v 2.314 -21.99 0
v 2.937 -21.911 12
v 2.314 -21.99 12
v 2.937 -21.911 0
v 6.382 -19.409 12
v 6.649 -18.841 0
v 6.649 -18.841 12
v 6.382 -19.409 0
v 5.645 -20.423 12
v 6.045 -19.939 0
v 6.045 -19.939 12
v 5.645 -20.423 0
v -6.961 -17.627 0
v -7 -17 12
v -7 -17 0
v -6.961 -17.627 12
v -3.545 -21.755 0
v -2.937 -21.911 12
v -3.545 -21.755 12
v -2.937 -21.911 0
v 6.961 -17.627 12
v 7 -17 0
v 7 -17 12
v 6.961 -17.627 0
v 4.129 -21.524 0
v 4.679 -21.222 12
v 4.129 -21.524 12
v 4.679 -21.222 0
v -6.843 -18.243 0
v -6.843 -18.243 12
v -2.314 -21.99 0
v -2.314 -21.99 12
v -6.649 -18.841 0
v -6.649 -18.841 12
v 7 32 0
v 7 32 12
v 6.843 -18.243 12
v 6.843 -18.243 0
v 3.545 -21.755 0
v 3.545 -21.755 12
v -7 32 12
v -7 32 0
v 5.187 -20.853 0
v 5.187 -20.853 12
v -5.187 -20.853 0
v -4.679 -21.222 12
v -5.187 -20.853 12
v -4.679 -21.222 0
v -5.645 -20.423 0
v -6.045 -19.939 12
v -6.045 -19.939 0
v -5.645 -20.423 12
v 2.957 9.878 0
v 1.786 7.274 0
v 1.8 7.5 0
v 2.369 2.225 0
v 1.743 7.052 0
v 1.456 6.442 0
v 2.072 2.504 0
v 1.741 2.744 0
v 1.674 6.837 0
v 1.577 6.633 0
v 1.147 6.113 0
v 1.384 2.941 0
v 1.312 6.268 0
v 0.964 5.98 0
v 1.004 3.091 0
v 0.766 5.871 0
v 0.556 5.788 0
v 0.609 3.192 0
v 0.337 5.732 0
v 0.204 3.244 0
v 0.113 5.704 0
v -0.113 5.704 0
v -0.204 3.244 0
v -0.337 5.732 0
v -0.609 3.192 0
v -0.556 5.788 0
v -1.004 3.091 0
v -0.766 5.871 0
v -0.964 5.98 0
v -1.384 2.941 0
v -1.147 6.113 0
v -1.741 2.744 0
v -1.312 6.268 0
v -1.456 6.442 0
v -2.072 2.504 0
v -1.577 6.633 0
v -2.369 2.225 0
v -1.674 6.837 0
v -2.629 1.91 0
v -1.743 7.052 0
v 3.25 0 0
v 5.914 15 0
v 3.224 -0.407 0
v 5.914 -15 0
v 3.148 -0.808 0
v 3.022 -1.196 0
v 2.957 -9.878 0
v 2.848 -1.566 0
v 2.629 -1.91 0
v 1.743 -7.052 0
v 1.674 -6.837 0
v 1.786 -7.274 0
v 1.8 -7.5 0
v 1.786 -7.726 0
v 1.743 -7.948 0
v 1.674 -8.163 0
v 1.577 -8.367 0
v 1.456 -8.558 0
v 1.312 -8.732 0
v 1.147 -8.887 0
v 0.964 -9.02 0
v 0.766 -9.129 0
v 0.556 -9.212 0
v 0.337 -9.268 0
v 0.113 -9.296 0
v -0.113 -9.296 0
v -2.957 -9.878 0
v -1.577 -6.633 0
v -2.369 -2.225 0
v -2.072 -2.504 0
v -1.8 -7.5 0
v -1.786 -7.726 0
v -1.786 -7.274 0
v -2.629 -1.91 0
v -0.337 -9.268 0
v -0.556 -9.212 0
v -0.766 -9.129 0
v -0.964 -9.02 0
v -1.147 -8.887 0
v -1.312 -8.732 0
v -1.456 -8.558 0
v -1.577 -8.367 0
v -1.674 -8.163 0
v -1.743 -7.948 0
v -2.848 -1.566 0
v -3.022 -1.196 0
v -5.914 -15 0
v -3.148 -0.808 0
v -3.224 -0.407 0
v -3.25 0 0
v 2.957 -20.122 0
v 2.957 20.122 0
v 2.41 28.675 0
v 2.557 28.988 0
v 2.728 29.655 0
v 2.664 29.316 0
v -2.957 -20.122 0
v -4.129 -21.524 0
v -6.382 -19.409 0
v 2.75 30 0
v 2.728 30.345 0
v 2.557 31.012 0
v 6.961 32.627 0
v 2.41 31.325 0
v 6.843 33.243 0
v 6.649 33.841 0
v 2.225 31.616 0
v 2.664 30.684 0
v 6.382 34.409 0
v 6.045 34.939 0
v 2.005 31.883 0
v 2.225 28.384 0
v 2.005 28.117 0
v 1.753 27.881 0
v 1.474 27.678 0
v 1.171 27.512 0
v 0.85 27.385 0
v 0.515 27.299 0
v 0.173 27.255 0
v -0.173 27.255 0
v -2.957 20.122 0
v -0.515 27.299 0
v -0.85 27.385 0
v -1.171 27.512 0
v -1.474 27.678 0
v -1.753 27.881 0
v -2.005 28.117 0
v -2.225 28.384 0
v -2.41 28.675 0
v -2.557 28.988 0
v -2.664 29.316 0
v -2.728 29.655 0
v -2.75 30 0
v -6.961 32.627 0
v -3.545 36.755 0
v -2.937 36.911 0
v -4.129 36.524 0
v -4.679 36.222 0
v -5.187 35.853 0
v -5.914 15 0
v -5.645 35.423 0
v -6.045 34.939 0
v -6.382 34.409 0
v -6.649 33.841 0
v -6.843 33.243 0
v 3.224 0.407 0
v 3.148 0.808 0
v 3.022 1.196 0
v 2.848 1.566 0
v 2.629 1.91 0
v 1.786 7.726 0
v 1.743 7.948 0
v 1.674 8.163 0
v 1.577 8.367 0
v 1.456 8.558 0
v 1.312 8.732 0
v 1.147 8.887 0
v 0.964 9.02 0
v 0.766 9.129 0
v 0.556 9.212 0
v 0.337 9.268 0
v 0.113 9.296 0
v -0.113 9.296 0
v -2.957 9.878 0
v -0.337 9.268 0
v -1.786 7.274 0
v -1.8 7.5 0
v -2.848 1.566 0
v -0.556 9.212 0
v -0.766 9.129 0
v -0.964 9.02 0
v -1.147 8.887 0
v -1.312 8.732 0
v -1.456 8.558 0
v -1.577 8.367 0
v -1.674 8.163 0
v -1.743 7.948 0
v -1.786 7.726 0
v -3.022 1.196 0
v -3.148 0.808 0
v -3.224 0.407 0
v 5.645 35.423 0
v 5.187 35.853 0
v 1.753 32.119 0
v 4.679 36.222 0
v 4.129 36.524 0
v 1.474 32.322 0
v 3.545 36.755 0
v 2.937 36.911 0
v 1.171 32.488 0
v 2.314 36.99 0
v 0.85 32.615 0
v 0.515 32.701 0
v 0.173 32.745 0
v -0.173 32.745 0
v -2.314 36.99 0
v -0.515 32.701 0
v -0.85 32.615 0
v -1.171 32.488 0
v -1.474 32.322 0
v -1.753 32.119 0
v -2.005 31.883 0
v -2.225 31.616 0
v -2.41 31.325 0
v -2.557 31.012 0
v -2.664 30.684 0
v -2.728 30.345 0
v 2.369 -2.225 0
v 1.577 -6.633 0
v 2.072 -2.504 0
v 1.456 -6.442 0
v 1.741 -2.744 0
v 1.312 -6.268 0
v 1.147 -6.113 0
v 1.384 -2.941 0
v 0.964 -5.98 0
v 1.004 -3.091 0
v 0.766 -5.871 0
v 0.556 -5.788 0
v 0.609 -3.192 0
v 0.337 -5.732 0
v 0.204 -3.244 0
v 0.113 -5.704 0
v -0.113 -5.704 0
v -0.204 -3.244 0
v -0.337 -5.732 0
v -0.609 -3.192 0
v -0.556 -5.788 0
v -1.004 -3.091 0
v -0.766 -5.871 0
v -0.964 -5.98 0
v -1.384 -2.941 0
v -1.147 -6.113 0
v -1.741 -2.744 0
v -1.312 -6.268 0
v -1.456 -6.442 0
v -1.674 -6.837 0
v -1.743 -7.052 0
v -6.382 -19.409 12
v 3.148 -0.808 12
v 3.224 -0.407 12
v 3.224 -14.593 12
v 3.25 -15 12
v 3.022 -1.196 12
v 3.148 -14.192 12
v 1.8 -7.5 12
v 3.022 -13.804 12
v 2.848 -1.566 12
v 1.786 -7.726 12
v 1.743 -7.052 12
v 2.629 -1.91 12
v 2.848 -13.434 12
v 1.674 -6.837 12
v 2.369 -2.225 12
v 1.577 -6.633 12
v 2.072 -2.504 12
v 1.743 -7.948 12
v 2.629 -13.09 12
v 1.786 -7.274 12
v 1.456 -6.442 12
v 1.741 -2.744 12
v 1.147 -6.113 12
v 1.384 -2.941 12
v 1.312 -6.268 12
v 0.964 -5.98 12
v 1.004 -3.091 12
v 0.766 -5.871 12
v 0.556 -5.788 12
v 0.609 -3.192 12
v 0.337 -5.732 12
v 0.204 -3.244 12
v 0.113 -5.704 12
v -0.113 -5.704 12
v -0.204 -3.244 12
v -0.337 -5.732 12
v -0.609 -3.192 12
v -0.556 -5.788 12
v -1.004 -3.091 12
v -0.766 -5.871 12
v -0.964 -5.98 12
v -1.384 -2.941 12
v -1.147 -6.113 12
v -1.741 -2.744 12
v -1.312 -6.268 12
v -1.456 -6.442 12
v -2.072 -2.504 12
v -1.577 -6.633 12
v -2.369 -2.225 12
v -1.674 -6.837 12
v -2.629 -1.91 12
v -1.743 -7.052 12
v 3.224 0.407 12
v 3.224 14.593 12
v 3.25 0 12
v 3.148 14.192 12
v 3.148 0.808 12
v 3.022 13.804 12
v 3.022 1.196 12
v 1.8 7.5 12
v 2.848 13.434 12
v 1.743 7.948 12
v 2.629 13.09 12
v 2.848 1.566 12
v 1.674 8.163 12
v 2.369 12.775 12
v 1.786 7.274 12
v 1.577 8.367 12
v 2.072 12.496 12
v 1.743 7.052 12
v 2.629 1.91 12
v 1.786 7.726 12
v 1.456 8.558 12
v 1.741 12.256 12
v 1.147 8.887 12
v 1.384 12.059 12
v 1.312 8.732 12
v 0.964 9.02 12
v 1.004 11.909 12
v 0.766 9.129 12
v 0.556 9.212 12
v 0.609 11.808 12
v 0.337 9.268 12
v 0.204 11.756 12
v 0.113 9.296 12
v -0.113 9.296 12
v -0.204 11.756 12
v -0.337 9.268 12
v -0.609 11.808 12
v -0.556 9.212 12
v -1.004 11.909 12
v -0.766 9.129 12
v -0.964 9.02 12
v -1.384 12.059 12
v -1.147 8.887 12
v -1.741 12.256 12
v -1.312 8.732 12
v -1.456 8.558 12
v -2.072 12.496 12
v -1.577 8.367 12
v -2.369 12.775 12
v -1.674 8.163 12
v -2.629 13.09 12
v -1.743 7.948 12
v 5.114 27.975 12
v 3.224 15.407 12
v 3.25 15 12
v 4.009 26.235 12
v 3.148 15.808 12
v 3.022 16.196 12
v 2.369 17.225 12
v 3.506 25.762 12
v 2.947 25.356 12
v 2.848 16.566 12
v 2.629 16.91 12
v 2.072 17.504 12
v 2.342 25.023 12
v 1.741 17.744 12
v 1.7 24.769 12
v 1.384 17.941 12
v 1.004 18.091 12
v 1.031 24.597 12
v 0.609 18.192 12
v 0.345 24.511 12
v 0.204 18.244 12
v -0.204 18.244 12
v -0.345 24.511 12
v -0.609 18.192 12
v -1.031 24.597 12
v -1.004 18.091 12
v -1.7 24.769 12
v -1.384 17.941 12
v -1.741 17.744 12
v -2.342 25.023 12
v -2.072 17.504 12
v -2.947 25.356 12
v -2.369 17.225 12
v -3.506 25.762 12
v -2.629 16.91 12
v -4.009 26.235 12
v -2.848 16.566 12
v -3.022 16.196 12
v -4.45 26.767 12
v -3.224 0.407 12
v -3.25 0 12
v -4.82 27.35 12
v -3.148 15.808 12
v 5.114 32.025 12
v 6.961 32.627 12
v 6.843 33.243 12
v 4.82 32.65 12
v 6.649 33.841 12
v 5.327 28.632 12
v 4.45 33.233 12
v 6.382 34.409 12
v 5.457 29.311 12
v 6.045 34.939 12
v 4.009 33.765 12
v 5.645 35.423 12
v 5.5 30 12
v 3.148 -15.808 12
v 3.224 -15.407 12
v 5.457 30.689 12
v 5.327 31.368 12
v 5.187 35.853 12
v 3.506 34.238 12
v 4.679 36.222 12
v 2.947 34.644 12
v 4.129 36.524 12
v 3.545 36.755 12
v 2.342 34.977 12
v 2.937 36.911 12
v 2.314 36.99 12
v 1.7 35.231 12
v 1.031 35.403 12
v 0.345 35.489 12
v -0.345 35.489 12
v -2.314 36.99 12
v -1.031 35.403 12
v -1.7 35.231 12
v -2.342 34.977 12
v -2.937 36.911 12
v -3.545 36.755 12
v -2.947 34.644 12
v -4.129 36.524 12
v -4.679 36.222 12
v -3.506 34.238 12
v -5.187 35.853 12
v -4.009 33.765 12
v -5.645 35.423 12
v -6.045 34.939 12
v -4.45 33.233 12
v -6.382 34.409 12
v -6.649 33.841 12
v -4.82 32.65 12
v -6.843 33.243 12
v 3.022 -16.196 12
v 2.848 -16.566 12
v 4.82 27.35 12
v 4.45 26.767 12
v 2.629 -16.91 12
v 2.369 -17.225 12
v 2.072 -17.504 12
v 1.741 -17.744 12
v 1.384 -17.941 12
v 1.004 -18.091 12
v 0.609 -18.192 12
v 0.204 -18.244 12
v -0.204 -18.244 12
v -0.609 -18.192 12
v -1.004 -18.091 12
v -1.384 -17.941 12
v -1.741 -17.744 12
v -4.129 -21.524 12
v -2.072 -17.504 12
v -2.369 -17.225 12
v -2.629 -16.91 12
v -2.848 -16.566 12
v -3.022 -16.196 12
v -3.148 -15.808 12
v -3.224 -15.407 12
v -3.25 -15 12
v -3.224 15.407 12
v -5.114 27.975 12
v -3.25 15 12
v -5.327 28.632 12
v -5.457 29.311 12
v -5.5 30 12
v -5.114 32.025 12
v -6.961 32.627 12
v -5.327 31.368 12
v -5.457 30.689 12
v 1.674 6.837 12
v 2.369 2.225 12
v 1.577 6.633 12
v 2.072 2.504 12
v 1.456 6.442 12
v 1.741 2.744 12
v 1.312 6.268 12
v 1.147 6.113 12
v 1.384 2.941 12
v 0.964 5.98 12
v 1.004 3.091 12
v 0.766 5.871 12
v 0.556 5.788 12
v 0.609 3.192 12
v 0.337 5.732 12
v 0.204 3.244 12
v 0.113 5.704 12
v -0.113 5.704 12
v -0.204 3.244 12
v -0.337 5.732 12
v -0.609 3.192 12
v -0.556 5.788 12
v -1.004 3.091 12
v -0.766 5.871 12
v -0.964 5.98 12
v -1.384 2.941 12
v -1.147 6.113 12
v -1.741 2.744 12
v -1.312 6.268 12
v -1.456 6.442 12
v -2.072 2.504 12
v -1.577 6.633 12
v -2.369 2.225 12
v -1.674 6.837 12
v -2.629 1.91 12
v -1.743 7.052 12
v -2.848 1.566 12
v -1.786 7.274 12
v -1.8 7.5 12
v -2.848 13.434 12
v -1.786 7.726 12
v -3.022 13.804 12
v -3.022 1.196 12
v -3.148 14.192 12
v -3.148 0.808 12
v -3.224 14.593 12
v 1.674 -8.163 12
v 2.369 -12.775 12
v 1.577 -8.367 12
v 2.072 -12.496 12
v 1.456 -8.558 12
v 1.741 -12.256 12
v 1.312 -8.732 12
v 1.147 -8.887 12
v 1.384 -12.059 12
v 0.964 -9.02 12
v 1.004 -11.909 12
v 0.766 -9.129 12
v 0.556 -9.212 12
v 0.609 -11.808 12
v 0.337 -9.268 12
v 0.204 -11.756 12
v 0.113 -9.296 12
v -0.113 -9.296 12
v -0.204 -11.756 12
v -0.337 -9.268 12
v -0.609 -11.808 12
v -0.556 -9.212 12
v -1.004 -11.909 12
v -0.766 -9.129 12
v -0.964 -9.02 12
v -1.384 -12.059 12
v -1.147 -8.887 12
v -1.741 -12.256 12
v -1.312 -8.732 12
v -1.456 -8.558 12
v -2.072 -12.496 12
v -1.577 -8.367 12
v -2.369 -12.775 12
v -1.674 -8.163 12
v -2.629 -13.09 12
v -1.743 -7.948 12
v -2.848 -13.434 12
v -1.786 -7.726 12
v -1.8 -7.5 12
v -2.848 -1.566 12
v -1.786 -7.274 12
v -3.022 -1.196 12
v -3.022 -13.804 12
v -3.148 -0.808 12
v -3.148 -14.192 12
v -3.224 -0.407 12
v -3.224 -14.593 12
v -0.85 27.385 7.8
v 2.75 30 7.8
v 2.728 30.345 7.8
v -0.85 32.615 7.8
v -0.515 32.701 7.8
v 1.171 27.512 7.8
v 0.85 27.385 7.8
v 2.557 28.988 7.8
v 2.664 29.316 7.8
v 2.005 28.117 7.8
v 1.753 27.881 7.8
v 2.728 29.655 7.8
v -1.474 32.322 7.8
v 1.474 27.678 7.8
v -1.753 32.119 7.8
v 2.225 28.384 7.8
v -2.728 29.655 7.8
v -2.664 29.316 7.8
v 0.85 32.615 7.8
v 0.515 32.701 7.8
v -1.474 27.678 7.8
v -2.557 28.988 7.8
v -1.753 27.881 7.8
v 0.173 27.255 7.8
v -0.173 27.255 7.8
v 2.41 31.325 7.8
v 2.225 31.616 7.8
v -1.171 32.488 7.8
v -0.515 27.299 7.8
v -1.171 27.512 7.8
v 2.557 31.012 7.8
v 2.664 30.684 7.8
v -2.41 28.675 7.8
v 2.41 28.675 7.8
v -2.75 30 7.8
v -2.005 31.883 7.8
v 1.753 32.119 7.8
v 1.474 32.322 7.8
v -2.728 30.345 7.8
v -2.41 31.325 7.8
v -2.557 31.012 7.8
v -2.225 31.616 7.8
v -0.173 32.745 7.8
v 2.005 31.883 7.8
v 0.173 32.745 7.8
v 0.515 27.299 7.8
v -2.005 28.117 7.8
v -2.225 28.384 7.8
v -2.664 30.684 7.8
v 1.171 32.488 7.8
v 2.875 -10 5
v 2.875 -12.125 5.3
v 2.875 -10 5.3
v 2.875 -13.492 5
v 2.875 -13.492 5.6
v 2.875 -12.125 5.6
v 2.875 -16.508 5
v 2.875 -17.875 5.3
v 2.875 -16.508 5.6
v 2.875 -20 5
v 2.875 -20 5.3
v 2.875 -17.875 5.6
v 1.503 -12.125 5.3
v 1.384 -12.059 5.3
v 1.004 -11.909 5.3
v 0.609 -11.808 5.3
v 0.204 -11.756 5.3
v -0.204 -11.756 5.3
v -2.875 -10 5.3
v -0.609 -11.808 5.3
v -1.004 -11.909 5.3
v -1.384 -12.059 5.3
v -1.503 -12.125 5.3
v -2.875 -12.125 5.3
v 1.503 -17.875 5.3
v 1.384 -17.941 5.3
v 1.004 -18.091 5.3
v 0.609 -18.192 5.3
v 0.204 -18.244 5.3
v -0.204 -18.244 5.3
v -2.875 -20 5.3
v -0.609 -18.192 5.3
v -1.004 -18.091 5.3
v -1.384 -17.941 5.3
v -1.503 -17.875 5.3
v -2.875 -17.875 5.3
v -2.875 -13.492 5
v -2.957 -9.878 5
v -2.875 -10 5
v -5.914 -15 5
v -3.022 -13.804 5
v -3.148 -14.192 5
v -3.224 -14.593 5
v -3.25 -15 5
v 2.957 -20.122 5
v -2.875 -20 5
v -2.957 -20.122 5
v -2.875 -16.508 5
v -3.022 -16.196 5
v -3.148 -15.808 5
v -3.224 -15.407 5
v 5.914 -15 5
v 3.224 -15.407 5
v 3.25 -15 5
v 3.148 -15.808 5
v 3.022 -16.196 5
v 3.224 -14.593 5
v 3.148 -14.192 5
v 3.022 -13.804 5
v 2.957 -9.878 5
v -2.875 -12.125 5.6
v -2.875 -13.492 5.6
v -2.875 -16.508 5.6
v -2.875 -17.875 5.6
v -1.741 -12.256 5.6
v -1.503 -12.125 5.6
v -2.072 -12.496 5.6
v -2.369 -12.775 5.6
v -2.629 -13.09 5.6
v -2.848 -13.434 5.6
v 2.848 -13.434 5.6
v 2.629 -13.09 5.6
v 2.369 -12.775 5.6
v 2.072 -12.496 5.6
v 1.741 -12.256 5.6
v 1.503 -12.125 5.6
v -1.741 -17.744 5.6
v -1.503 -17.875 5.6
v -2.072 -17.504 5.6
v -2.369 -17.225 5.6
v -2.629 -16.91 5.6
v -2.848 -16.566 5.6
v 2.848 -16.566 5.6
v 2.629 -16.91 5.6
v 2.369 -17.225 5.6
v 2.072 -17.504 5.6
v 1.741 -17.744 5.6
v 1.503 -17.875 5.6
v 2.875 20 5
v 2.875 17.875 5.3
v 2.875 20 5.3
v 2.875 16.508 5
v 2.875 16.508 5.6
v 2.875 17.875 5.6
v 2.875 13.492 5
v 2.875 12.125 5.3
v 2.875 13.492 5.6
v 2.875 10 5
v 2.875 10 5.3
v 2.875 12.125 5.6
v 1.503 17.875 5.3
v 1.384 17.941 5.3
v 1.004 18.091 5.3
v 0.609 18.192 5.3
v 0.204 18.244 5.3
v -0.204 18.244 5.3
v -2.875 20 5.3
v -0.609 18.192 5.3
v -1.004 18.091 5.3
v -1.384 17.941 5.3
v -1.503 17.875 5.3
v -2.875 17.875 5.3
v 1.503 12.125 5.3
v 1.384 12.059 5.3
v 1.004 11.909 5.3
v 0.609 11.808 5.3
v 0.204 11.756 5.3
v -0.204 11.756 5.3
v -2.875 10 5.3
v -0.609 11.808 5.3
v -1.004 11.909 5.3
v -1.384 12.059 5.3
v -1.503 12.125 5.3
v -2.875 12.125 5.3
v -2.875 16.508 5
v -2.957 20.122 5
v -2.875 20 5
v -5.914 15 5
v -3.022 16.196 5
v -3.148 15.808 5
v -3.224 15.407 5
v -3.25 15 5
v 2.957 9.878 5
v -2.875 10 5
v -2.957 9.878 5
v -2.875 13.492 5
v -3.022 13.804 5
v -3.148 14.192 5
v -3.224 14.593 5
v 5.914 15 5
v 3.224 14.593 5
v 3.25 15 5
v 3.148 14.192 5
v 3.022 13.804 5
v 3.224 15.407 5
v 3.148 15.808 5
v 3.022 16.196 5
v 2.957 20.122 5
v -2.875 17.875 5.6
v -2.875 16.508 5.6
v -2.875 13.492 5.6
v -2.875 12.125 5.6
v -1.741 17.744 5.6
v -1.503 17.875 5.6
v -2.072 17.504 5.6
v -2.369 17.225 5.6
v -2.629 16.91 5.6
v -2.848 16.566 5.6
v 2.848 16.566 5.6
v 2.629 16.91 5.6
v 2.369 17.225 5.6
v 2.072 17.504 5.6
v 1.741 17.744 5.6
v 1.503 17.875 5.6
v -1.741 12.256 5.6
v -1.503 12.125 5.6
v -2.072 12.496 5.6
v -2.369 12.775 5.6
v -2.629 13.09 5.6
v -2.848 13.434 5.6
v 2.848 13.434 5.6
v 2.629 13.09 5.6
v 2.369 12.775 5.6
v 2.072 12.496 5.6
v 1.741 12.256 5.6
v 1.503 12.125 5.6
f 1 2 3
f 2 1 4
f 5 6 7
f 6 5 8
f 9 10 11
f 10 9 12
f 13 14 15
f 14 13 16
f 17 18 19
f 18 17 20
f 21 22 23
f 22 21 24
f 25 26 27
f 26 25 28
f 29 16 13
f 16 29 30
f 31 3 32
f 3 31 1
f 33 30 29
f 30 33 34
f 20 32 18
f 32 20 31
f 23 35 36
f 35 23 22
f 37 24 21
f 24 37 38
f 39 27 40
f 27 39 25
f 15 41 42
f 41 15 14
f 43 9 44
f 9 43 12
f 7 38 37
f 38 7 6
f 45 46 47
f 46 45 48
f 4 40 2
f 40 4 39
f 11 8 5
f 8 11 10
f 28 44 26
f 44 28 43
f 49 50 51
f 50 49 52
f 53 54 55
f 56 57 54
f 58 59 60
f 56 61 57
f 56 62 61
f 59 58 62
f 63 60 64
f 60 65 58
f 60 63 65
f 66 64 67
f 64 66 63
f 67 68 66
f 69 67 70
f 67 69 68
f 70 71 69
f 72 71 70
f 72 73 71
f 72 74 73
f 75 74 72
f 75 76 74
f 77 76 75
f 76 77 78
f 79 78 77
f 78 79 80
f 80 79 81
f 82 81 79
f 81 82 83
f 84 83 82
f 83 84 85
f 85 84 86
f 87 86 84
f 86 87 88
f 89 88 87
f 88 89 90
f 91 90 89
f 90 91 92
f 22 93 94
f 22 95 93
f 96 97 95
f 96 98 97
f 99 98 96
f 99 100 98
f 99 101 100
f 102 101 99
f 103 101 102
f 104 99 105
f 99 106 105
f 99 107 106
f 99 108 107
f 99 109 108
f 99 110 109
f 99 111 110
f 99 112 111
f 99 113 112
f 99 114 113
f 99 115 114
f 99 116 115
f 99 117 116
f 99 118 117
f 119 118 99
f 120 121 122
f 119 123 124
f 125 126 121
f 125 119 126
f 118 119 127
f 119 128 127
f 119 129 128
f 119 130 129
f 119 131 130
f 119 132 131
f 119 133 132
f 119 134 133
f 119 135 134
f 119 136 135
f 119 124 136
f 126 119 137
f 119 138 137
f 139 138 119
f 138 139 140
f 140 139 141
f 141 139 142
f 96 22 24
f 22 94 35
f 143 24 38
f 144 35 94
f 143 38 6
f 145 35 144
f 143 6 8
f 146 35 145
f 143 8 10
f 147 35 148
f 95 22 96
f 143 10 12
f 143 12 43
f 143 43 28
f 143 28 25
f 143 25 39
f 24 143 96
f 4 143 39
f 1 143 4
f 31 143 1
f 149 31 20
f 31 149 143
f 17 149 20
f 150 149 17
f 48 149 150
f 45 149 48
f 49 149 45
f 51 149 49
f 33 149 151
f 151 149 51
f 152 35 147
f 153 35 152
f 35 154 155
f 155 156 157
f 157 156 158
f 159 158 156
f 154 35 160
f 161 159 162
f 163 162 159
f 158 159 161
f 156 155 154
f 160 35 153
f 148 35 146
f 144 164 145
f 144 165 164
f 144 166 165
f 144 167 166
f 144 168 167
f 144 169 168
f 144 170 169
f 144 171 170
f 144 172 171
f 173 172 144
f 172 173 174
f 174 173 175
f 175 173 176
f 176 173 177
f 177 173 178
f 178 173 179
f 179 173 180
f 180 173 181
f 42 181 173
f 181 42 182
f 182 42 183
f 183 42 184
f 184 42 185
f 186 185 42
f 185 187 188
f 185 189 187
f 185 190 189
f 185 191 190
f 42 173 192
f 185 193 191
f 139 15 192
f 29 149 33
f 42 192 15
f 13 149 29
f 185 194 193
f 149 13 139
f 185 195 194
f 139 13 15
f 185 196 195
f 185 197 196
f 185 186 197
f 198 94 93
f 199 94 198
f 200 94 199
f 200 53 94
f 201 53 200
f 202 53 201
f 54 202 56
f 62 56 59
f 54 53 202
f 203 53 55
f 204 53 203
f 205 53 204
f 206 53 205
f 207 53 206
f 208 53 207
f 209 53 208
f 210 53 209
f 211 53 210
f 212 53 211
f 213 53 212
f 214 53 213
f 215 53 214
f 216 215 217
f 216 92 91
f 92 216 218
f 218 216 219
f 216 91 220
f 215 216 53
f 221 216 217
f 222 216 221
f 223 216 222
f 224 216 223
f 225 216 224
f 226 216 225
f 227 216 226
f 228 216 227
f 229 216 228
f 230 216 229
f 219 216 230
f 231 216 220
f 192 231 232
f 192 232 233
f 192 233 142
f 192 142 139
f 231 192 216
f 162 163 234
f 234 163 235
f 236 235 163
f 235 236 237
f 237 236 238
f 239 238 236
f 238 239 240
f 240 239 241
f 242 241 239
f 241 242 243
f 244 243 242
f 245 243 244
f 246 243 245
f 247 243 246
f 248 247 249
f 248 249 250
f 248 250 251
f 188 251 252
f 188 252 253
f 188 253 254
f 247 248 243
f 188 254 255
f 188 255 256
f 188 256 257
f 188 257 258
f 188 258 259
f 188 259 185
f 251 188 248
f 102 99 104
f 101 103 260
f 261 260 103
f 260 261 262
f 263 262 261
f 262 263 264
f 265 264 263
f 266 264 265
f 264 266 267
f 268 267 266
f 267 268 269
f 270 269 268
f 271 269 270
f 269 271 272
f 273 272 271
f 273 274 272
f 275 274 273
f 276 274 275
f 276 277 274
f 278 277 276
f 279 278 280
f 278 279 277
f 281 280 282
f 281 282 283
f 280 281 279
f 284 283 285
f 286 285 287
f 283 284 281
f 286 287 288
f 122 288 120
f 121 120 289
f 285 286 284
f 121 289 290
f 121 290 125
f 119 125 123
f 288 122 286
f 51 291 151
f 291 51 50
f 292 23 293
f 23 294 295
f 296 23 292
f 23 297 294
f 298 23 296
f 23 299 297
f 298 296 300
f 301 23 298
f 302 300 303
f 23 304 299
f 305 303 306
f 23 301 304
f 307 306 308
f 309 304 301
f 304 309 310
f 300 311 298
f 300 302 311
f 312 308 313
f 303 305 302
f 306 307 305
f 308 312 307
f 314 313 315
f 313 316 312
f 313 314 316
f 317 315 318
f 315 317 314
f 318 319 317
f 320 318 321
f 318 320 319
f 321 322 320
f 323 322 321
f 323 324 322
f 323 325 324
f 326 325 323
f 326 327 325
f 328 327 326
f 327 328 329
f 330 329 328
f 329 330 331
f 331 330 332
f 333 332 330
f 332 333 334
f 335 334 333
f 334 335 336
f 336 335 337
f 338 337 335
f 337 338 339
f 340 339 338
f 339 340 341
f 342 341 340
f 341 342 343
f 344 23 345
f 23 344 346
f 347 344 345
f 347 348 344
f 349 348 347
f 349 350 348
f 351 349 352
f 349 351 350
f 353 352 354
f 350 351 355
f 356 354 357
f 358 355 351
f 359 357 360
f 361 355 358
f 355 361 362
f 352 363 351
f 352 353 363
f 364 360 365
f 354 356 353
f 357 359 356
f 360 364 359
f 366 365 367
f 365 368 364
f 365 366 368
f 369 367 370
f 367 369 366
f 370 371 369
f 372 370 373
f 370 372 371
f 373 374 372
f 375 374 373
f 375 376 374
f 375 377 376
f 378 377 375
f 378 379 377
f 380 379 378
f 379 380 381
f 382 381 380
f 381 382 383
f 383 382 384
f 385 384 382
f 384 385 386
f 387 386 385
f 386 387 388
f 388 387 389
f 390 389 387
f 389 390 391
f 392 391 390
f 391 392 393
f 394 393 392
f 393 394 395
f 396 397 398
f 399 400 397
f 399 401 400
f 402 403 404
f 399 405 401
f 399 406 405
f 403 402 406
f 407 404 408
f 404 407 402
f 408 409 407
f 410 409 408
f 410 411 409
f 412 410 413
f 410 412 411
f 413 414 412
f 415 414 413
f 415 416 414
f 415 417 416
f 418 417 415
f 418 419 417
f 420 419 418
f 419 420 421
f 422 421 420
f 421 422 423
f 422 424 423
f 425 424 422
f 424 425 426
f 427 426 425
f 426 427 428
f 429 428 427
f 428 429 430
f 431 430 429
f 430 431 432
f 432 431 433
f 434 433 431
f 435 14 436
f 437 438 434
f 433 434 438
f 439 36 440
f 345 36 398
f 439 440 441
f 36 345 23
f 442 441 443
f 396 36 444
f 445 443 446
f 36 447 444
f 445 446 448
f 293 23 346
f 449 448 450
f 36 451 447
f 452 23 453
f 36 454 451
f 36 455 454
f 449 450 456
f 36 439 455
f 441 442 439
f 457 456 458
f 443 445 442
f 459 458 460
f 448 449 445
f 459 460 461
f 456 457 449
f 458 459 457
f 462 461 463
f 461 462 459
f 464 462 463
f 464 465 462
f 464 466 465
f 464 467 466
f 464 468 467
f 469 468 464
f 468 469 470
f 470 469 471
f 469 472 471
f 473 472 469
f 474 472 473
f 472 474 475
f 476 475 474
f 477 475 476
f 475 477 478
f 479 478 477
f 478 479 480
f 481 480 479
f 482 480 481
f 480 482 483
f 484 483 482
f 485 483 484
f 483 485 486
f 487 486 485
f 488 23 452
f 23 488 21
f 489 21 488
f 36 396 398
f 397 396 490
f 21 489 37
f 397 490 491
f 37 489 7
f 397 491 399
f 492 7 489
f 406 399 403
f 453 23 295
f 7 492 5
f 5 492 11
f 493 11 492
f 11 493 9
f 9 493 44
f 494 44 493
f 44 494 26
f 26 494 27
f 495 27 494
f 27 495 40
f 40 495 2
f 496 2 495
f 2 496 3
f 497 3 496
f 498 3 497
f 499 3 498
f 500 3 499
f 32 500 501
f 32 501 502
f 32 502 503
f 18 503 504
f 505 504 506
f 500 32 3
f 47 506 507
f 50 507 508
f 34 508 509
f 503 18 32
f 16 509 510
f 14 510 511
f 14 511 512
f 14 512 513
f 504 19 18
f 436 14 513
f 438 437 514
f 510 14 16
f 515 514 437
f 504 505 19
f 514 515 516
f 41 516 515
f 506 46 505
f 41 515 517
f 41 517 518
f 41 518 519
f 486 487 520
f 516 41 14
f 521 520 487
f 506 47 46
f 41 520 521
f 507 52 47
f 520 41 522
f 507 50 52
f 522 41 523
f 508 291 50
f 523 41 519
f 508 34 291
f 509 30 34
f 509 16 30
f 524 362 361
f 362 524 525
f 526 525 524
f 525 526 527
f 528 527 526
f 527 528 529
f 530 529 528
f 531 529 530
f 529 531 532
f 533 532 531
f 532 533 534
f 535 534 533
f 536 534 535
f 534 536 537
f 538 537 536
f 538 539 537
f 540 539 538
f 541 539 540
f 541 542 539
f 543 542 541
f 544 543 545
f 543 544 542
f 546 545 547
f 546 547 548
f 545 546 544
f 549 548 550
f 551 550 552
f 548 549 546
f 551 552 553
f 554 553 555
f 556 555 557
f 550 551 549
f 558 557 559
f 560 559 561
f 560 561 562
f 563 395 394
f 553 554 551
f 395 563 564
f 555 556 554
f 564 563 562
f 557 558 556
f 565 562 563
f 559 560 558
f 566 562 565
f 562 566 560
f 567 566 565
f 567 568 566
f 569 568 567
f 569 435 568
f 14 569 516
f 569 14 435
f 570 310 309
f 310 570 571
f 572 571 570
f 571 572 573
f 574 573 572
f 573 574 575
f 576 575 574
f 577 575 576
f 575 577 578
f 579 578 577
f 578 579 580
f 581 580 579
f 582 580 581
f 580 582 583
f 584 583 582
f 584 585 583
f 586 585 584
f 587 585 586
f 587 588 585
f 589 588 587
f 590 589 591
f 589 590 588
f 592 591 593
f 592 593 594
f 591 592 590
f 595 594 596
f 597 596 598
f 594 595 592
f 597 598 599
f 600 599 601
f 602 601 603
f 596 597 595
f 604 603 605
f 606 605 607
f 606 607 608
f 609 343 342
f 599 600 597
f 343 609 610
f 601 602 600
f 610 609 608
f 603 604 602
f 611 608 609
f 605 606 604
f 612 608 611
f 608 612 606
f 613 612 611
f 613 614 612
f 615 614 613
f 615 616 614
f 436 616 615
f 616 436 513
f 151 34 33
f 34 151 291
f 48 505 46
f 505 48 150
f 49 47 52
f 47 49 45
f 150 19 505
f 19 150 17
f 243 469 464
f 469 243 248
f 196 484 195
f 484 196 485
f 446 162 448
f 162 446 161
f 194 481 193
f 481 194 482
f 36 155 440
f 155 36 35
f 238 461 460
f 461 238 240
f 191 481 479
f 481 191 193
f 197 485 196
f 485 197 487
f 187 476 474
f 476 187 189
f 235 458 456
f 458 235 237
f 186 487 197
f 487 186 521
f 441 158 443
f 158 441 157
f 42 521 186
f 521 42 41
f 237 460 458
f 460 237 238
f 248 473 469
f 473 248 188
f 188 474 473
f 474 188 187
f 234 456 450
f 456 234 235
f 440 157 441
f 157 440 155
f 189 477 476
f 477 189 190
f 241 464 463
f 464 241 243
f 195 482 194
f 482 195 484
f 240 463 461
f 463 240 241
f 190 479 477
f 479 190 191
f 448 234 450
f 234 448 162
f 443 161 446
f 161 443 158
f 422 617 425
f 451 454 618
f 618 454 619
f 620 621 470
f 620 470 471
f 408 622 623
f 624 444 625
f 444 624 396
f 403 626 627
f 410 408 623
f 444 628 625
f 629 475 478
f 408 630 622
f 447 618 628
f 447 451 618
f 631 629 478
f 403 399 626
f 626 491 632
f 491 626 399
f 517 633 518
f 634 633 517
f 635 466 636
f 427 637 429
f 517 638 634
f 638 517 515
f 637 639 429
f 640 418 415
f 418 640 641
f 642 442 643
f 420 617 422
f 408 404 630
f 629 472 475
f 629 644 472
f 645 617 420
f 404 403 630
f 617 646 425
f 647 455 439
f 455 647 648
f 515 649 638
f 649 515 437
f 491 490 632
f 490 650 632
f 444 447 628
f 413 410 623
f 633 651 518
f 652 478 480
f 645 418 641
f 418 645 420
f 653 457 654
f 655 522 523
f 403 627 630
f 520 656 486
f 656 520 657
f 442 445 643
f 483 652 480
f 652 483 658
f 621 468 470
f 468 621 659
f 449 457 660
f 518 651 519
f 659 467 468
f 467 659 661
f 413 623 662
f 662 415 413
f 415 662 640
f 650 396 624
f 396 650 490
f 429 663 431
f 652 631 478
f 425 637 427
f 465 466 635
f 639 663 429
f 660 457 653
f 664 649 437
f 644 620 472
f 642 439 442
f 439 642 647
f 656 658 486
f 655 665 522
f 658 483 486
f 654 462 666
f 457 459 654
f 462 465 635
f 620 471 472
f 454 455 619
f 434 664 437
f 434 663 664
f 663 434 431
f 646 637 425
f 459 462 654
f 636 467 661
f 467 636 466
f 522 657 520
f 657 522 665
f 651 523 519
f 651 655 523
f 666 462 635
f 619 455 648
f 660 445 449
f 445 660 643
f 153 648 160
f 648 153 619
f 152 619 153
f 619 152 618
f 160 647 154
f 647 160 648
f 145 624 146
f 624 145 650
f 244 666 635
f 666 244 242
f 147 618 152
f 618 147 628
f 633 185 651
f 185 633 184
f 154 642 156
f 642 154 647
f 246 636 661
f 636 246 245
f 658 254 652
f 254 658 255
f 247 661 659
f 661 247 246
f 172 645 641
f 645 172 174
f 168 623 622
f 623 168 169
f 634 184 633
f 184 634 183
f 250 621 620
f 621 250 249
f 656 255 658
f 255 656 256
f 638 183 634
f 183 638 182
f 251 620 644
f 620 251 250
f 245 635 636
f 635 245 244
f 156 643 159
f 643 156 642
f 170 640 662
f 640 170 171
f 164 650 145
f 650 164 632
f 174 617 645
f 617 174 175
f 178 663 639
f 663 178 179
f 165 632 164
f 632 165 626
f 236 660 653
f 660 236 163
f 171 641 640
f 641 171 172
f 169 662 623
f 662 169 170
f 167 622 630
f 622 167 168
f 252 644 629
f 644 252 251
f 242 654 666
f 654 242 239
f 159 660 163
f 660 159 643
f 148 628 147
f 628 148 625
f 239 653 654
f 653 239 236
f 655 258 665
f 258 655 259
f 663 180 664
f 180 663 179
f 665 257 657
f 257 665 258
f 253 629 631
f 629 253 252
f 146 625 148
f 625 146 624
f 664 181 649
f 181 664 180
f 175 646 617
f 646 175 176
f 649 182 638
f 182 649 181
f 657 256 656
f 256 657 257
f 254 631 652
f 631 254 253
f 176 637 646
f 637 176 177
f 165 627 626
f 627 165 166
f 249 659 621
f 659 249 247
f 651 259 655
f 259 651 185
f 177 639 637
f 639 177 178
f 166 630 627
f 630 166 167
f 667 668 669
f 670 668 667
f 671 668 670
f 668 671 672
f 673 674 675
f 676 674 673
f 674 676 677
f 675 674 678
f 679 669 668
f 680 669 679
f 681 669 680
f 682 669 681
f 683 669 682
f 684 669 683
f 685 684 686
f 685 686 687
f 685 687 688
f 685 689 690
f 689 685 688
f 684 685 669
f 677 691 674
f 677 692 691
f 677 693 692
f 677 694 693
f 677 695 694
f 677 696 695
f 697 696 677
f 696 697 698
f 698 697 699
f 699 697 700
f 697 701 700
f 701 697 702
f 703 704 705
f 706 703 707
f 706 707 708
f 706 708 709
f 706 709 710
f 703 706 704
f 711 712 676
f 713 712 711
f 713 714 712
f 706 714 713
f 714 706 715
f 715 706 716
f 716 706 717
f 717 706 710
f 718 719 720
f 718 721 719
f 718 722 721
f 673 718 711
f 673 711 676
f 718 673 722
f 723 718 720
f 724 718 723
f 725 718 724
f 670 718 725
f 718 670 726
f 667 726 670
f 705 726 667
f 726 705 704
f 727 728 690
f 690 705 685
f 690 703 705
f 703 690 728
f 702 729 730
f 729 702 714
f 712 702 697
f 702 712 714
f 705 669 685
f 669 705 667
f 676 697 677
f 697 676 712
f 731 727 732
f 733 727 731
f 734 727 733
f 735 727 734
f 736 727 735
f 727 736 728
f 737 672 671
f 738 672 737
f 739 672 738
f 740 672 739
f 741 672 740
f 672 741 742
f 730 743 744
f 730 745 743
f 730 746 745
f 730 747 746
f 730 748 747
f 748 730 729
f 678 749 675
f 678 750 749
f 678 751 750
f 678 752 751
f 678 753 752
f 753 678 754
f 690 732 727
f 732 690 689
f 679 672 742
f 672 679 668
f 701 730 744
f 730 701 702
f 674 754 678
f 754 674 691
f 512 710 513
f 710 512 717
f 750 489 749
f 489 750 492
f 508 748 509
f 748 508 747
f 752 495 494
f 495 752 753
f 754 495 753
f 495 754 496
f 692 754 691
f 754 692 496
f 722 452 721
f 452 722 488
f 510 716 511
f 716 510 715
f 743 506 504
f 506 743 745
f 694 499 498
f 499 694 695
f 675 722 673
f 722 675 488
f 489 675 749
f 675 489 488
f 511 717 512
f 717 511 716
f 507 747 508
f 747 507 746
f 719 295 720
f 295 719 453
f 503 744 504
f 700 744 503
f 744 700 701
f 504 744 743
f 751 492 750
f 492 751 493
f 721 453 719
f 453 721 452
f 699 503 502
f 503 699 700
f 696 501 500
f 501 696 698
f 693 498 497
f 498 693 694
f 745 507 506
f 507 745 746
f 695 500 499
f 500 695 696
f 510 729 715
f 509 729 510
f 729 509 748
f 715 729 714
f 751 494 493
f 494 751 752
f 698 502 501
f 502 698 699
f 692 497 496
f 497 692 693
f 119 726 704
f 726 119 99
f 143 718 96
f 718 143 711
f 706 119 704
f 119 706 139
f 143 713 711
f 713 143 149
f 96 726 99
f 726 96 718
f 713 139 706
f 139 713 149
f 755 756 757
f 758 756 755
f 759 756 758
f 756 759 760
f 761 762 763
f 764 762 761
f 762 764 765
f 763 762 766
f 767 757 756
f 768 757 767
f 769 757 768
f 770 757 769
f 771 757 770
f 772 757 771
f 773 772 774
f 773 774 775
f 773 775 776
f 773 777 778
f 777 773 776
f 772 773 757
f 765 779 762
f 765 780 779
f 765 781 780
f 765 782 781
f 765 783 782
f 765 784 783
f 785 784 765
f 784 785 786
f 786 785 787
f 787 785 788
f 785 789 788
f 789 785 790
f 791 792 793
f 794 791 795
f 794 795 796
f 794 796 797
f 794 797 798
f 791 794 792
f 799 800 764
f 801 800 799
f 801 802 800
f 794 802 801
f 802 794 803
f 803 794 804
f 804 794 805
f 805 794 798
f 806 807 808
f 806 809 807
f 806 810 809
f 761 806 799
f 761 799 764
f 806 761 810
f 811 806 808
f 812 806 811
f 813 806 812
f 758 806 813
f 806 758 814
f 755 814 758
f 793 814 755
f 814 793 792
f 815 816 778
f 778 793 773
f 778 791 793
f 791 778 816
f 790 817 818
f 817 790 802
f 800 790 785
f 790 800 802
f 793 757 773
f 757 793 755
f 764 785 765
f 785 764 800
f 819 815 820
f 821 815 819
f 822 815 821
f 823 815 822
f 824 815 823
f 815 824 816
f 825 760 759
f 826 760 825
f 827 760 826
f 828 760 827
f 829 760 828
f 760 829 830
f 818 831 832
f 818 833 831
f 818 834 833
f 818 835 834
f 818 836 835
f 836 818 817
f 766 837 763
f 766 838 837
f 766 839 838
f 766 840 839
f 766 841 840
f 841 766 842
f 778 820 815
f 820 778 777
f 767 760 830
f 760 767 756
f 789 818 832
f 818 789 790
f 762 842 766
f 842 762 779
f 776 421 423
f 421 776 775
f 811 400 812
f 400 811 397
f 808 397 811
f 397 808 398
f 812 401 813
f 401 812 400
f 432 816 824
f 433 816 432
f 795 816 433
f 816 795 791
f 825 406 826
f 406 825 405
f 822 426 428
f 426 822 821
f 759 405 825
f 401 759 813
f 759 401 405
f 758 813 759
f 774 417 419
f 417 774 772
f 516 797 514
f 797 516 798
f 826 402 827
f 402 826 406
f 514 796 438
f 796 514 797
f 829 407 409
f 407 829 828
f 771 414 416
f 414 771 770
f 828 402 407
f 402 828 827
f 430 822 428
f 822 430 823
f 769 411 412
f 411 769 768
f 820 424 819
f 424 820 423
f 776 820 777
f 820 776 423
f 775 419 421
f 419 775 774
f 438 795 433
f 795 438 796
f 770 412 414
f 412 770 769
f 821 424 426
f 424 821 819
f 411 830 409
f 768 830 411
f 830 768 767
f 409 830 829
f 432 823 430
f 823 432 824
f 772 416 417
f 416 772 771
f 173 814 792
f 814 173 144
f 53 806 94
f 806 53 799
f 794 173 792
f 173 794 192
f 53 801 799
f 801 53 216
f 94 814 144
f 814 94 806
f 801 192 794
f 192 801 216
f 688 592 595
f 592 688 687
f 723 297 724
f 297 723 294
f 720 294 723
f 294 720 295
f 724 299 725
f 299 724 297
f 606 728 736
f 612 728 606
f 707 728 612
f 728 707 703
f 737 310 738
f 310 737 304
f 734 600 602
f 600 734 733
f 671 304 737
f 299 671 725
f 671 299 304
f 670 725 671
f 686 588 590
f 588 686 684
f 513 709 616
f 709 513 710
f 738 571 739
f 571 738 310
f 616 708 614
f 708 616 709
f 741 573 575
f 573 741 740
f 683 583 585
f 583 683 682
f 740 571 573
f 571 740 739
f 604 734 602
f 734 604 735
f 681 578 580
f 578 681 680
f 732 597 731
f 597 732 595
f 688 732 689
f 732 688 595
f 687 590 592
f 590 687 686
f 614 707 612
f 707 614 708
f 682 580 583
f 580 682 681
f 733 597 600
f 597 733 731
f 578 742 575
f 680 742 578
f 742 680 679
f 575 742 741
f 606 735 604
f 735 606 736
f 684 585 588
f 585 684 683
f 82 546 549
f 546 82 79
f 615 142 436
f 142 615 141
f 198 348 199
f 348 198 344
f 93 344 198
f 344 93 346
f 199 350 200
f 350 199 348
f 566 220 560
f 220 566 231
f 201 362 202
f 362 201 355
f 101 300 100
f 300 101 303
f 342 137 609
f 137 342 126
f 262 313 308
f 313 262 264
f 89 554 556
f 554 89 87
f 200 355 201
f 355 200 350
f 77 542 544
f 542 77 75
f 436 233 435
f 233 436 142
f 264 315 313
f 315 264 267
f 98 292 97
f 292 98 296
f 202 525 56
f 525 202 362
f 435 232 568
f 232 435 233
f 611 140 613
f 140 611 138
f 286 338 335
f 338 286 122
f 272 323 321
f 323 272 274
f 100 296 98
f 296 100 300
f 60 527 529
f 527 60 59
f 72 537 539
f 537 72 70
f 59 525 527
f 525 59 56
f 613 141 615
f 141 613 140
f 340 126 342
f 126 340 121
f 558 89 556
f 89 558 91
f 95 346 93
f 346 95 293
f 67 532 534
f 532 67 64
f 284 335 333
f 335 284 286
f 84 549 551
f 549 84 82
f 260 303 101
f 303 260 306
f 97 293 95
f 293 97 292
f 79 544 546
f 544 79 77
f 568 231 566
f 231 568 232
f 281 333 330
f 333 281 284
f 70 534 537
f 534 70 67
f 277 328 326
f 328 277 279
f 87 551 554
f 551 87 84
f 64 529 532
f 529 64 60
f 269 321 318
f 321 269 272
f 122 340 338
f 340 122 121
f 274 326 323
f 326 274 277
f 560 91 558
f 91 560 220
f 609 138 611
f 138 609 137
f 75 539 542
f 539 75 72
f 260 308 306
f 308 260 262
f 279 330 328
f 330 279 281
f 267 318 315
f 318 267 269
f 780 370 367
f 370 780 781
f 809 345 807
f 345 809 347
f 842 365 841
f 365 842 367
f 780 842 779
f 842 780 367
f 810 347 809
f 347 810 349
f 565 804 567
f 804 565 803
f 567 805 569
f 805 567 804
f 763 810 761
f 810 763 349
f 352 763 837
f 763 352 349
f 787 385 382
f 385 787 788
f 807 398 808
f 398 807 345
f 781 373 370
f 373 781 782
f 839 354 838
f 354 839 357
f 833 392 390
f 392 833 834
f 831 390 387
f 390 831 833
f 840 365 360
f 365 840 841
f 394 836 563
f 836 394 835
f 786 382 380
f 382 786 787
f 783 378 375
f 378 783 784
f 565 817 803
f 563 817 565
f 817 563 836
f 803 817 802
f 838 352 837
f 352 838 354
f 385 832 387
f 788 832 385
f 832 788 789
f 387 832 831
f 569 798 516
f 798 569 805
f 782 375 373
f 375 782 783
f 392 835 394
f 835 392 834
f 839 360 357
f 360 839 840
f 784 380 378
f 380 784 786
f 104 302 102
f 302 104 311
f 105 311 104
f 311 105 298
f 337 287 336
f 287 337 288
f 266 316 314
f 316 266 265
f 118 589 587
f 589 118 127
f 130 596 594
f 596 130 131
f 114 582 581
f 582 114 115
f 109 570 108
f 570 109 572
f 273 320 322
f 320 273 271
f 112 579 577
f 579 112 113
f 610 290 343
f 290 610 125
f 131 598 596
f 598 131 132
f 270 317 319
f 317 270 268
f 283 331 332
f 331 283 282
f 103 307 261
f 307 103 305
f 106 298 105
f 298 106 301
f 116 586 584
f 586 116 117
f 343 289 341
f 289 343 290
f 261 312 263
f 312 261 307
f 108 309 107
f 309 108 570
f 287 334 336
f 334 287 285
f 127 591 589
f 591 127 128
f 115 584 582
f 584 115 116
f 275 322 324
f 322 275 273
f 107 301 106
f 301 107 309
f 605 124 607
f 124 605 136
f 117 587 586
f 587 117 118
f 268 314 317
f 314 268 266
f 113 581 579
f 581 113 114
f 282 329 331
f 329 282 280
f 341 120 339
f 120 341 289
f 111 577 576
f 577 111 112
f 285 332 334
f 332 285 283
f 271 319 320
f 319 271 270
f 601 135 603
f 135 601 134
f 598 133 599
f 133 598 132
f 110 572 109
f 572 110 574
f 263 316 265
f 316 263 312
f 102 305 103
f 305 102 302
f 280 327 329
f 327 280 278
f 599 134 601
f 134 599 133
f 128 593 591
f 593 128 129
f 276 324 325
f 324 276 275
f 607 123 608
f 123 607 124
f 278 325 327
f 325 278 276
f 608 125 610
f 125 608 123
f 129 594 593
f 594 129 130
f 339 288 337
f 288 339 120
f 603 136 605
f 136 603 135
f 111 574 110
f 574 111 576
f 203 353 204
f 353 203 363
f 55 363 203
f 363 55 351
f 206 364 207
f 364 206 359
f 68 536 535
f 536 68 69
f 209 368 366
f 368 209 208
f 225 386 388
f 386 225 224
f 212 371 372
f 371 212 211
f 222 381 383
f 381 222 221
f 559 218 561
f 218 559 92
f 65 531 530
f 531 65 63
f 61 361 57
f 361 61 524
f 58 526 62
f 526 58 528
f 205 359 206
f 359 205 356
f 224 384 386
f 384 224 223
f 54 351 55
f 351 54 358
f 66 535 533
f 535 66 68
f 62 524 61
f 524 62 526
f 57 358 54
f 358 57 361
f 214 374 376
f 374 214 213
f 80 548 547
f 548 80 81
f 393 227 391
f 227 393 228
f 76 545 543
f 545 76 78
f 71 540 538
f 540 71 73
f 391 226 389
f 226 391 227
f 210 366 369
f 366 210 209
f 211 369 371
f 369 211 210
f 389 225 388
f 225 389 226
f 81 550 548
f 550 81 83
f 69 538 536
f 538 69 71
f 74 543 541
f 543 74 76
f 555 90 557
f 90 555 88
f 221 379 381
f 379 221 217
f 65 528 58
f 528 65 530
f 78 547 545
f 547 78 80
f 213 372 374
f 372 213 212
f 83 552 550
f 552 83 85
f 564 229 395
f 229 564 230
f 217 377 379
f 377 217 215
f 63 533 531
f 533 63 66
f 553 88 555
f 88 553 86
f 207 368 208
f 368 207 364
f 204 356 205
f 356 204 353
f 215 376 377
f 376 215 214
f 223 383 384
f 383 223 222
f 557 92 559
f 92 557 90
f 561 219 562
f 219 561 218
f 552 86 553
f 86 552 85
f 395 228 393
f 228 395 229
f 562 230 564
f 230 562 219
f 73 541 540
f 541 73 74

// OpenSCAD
$fn = 50;


difference() {
	union() {
		hull() {
			translate(v = [-2.0000000000, 17.0000000000, 0]) {
				cylinder(h = 12, r = 5);
			}
			translate(v = [2.0000000000, 17.0000000000, 0]) {
				cylinder(h = 12, r = 5);
			}
			translate(v = [-2.0000000000, -17.0000000000, 0]) {
				cylinder(h = 12, r = 5);
			}
			translate(v = [2.0000000000, -17.0000000000, 0]) {
				cylinder(h = 12, r = 5);
			}
		}
		translate(v = [0.0000000000, 22.5000000000, 0]) {
			hull() {
				translate(v = [-2.0000000000, 9.5000000000, 0]) {
					cylinder(h = 12, r = 5);
				}
				translate(v = [2.0000000000, 9.5000000000, 0]) {
					cylinder(h = 12, r = 5);
				}
				translate(v = [-2.0000000000, -9.5000000000, 0]) {
					cylinder(h = 12, r = 5);
				}
				translate(v = [2.0000000000, -9.5000000000, 0]) {
					cylinder(h = 12, r = 5);
				}
			}
		}
		translate(v = [0.0000000000, 22.5000000000, 0]) {
			hull() {
				translate(v = [-2.0000000000, 9.5000000000, 0]) {
					cylinder(h = 12, r = 5);
				}
				translate(v = [2.0000000000, 9.5000000000, 0]) {
					cylinder(h = 12, r = 5);
				}
				translate(v = [-2.0000000000, -9.5000000000, 0]) {
					cylinder(h = 12, r = 5);
				}
				translate(v = [2.0000000000, -9.5000000000, 0]) {
					cylinder(h = 12, r = 5);
				}
			}
		}
	}
	union() {
		translate(v = [0.0000000000, 30.0000000000, 12]) {
			rotate(a = [0, 0, 0]) {
				difference() {
					union() {
						#translate(v = [0, 0, -12.0000000000]) {
							cylinder(h = 12, r = 2.2500000000);
						}
						#translate(v = [0, 0, -4.2000000000]) {
							cylinder(h = 4.2000000000, r1 = 2.7500000000, r2 = 5.5000000000);
						}
						#translate(v = [0, 0, -12.0000000000]) {
							cylinder(h = 12, r = 2.7500000000);
						}
						#translate(v = [0, 0, -12.0000000000]) {
							cylinder(h = 12, r = 2.2500000000);
						}
					}
					union();
				}
			}
		}
		translate(v = [0.0000000000, 30.0000000000, 12]) {
			rotate(a = [0, 0, 0]) {
				difference() {
					union() {
						#translate(v = [0, 0, -12.0000000000]) {
							cylinder(h = 12, r = 2.2500000000);
						}
						#translate(v = [0, 0, -4.2000000000]) {
							cylinder(h = 4.2000000000, r1 = 2.7500000000, r2 = 5.5000000000);
						}
						#translate(v = [0, 0, -12.0000000000]) {
							cylinder(h = 12, r = 2.7500000000);
						}
						#translate(v = [0, 0, -12.0000000000]) {
							cylinder(h = 12, r = 2.2500000000);
						}
					}
					union();
				}
			}
		}
		translate(v = [0.0000000000, -15.0000000000, 0]) {
			rotate(a = [0, 0, 0]) {
				difference() {
					union() {
						#translate(v = [-2.8750000000, -5.0000000000, -0.3000000000]) {
							cube(size = [5.7500000000, 10, 0.3000000000]);
						}
						#translate(v = [-2.8750000000, -2.8750000000, -0.6000000000]) {
							cube(size = [5.7500000000, 5.7500000000, 0.3000000000]);
						}
						#translate(v = [-2.8750000000, -5.0000000000, 5]) {
							cube(size = [5.7500000000, 10, 0.3000000000]);
						}
						#translate(v = [-2.8750000000, -2.8750000000, 5.3000000000]) {
							cube(size = [5.7500000000, 5.7500000000, 0.3000000000]);
						}
						#translate(v = [0, 0, -100.0000000000]) {
							cylinder(h = 200, r = 3.2500000000);
						}
						#linear_extrude(height = 5) {
							polygon(points = [[5.9142500000, 0.0000000000], [2.9571250000, 5.1218907443], [-2.9571250000, 5.1218907443], [-5.9142500000, 0.0000000000], [-2.9571250000, -5.1218907443], [2.9571250000, -5.1218907443]]);
						}
						#translate(v = [-2.8750000000, -5.0000000000, -0.3000000000]) {
							cube(size = [5.7500000000, 10, 0.3000000000]);
						}
						#translate(v = [-2.8750000000, -2.8750000000, -0.6000000000]) {
							cube(size = [5.7500000000, 5.7500000000, 0.3000000000]);
						}
						#translate(v = [-2.8750000000, -5.0000000000, 5]) {
							cube(size = [5.7500000000, 10, 0.3000000000]);
						}
						#translate(v = [-2.8750000000, -2.8750000000, 5.3000000000]) {
							cube(size = [5.7500000000, 5.7500000000, 0.3000000000]);
						}
						#translate(v = [0, 0, -100.0000000000]) {
							cylinder(h = 200, r = 3.2500000000);
						}
						#translate(v = [-2.8750000000, -5.0000000000, -0.3000000000]) {
							cube(size = [5.7500000000, 10, 0.3000000000]);
						}
						#translate(v = [-2.8750000000, -2.8750000000, -0.6000000000]) {
							cube(size = [5.7500000000, 5.7500000000, 0.3000000000]);
						}
						#translate(v = [-2.8750000000, -5.0000000000, 5]) {
							cube(size = [5.7500000000, 10, 0.3000000000]);
						}
						#translate(v = [-2.8750000000, -2.8750000000, 5.3000000000]) {
							cube(size = [5.7500000000, 5.7500000000, 0.3000000000]);
						}
						#translate(v = [0, 0, -100.0000000000]) {
							cylinder(h = 200, r = 3.2500000000);
						}
					}
					union();
				}
			}
		}
		translate(v = [0.0000000000, 15.0000000000, 0]) {
			rotate(a = [0, 0, 0]) {
				difference() {
					union() {
						#translate(v = [-2.8750000000, -5.0000000000, -0.3000000000]) {
							cube(size = [5.7500000000, 10, 0.3000000000]);
						}
						#translate(v = [-2.8750000000, -2.8750000000, -0.6000000000]) {
							cube(size = [5.7500000000, 5.7500000000, 0.3000000000]);
						}
						#translate(v = [-2.8750000000, -5.0000000000, 5]) {
							cube(size = [5.7500000000, 10, 0.3000000000]);
						}
						#translate(v = [-2.8750000000, -2.8750000000, 5.3000000000]) {
							cube(size = [5.7500000000, 5.7500000000, 0.3000000000]);
						}
						#translate(v = [0, 0, -100.0000000000]) {
							cylinder(h = 200, r = 3.2500000000);
						}
						#linear_extrude(height = 5) {
							polygon(points = [[5.9142500000, 0.0000000000], [2.9571250000, 5.1218907443], [-2.9571250000, 5.1218907443], [-5.9142500000, 0.0000000000], [-2.9571250000, -5.1218907443], [2.9571250000, -5.1218907443]]);
						}
						#translate(v = [-2.8750000000, -5.0000000000, -0.3000000000]) {
							cube(size = [5.7500000000, 10, 0.3000000000]);
						}
						#translate(v = [-2.8750000000, -2.8750000000, -0.6000000000]) {
							cube(size = [5.7500000000, 5.7500000000, 0.3000000000]);
						}
						#translate(v = [-2.8750000000, -5.0000000000, 5]) {
							cube(size = [5.7500000000, 10, 0.3000000000]);
						}
						#translate(v = [-2.8750000000, -2.8750000000, 5.3000000000]) {
							cube(size = [5.7500000000, 5.7500000000, 0.3000000000]);
						}
						#translate(v = [0, 0, -100.0000000000]) {
							cylinder(h = 200, r = 3.2500000000);
						}
						#translate(v = [-2.8750000000, -5.0000000000, -0.3000000000]) {
							cube(size = [5.7500000000, 10, 0.3000000000]);
						}
						#translate(v = [-2.8750000000, -2.8750000000, -0.6000000000]) {
							cube(size = [5.7500000000, 5.7500000000, 0.3000000000]);
						}
						#translate(v = [-2.8750000000, -5.0000000000, 5]) {
							cube(size = [5.7500000000, 10, 0.3000000000]);
						}
						#translate(v = [-2.8750000000, -2.8750000000, 5.3000000000]) {
							cube(size = [5.7500000000, 5.7500000000, 0.3000000000]);
						}
						#translate(v = [0, 0, -100.0000000000]) {
							cylinder(h = 200, r = 3.2500000000);
						}
					}
					union();
				}
			}
		}
		translate(v = [0.0000000000, -15.0000000000, 0]) {
			translate(v = [0, 0, -100]) {
				cylinder(h = 200, r = 3.2500000000);
			}
		}
		translate(v = [0, 0, -100]) {
			cylinder(h = 200, r = 3.2500000000);
		}
		translate(v = [0.0000000000, 15.0000000000, 0]) {
			translate(v = [0, 0, -100]) {
				cylinder(h = 200, r = 3.2500000000);
			}
		}
		translate(v = [0.0000000000, -15.0000000000, 0]) {
			translate(v = [0, 0, -100]) {
				cylinder(h = 200, r = 1.8000000000);
			}
		}
		translate(v = [0.0000000000, -7.5000000000, 0]) {
			translate(v = [0, 0, -100]) {
				cylinder(h = 200, r = 1.8000000000);
			}
		}
		translate(v = [0, 0, -100]) {
			cylinder(h = 200, r = 1.8000000000);
		}
		translate(v = [0.0000000000, 7.5000000000, 0]) {
			translate(v = [0, 0, -100]) {
				cylinder(h = 200, r = 1.8000000000);
			}
		}
		translate(v = [0.0000000000, 15.0000000000, 0]) {
			translate(v = [0, 0, -100]) {
				cylinder(h = 200, r = 1.8000000000);
			}
		}
	}
}
